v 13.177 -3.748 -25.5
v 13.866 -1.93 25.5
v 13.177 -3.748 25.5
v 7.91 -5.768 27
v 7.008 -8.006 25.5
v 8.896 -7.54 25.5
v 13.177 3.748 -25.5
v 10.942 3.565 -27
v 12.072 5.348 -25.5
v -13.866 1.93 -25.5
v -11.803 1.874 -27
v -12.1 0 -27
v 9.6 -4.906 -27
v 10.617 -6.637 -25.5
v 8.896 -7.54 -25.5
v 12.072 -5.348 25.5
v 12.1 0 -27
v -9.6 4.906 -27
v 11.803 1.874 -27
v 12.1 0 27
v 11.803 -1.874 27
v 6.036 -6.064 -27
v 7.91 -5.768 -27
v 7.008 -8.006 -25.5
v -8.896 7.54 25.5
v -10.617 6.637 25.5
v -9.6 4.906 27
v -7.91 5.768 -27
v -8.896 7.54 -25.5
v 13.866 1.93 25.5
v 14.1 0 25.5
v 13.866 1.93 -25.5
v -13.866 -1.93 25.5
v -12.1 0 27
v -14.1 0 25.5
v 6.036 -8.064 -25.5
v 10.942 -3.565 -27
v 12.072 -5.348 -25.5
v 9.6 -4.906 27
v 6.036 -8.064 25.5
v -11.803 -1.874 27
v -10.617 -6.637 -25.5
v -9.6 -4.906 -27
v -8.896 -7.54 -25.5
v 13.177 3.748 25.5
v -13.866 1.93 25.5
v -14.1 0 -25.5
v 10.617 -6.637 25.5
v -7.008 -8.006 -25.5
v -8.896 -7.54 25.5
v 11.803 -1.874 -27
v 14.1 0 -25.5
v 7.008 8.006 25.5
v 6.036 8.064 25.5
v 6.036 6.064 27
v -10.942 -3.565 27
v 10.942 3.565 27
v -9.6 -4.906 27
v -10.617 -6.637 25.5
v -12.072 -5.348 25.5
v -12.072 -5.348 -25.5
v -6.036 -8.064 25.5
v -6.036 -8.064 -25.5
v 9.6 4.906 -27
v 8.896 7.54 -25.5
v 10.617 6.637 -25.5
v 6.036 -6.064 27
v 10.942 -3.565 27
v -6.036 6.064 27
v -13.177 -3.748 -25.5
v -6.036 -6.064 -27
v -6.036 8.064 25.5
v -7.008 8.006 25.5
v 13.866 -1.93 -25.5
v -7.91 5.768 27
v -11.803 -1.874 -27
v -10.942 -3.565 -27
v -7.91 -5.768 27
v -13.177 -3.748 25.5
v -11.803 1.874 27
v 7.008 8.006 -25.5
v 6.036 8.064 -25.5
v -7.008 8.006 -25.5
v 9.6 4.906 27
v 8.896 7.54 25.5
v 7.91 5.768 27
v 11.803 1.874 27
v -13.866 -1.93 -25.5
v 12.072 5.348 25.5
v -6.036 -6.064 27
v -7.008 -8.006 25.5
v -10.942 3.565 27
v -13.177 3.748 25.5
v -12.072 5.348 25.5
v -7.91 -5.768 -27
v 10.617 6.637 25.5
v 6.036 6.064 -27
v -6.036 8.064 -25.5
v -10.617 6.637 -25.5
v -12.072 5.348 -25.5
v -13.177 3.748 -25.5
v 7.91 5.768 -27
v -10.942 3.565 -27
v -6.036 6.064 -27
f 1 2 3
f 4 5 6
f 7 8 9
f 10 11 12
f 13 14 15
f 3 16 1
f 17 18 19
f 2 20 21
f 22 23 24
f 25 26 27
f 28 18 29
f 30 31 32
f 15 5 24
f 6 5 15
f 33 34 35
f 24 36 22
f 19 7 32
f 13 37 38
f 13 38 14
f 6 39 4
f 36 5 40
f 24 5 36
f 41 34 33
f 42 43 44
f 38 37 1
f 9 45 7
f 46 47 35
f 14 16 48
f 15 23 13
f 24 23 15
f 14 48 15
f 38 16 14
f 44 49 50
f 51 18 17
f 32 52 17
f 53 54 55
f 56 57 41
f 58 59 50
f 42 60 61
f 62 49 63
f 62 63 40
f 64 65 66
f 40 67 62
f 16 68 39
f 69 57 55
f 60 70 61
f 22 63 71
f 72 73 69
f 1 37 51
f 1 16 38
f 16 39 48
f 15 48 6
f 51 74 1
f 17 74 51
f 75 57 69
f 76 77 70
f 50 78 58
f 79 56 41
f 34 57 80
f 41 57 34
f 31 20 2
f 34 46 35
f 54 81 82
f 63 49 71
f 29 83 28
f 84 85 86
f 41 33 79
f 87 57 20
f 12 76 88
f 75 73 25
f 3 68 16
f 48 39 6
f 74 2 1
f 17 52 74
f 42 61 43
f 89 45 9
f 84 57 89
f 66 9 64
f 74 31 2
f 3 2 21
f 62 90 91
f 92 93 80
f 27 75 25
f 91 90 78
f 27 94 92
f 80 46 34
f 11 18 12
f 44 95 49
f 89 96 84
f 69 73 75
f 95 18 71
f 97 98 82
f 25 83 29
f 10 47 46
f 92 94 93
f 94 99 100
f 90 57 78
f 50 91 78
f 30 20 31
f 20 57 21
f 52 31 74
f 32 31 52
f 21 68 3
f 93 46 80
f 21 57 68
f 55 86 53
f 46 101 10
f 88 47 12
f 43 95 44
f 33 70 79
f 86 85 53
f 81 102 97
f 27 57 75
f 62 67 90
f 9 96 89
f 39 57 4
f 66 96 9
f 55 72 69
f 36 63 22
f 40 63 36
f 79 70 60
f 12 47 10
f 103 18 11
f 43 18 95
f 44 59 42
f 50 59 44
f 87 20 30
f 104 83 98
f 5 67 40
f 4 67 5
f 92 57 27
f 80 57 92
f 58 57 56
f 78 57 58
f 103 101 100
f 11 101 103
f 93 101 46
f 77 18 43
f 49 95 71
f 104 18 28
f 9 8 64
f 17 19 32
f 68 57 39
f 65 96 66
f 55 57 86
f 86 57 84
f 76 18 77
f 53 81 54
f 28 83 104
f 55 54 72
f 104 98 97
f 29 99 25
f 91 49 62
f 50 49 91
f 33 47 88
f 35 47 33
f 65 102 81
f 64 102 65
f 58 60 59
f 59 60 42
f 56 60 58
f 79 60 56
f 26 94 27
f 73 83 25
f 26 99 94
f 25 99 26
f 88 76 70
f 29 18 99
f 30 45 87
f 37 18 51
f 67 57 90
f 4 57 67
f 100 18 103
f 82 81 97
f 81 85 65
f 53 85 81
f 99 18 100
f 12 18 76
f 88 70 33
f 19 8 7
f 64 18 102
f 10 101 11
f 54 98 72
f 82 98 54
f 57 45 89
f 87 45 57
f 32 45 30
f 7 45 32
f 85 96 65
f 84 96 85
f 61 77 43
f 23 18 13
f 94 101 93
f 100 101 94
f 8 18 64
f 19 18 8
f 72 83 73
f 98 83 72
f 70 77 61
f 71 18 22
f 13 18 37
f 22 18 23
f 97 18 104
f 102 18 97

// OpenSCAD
// test_hull_compact_nut_base.scad
//
// Isolated "base" of compact_nut_seat: just the FIRST hull — the hull of the
// two concentric, coaxial extruded prisms (everything else in the model is
// stripped out).  Use this to iterate on the smooth concentric-hull path
// without the later cube/cylinder hulls running on top.
//
// Profile is the ORIGINAL one (taken verbatim from compact_nut_seat_fn0.csg):
// union(circle@+6.036, circle@-6.036, square) — a square with a true circular
// bulge on each side.  Both circles are $fn=0 so the importer builds them as
// TRUE circles (matching topology between wide and narrow → the piecewise
// bridge pairs them and the hull stays smooth).
//   wide  : square 12.0717 x 16.1288, circles r=8.06439, extrude h=51
//   narrow: square 12.0717 x 12.1288, circles r=6.06439, extrude h=54
//
// NB: test_hull_compact_nut_base.csg in this folder is extracted byte-for-byte
// from the original CSG — import that one directly for an exact repro.

$fn = 0;   // true circles -> smooth (non-faceted) hull path

hull() {
    // wide + short
    linear_extrude(height = 51, center = true)
        union() {
            translate([ 6.03586, 0]) circle(r = 8.06439);
            translate([-6.03586, 0]) circle(r = 8.06439);
            square([12.0717, 16.1288], center = true);
        }

    // narrow + tall
    linear_extrude(height = 54, center = true)
        union() {
            translate([ 6.03586, 0]) circle(r = 6.06439);
            translate([-6.03586, 0]) circle(r = 6.06439);
            square([12.0717, 12.1288], center = true);
        }
}
